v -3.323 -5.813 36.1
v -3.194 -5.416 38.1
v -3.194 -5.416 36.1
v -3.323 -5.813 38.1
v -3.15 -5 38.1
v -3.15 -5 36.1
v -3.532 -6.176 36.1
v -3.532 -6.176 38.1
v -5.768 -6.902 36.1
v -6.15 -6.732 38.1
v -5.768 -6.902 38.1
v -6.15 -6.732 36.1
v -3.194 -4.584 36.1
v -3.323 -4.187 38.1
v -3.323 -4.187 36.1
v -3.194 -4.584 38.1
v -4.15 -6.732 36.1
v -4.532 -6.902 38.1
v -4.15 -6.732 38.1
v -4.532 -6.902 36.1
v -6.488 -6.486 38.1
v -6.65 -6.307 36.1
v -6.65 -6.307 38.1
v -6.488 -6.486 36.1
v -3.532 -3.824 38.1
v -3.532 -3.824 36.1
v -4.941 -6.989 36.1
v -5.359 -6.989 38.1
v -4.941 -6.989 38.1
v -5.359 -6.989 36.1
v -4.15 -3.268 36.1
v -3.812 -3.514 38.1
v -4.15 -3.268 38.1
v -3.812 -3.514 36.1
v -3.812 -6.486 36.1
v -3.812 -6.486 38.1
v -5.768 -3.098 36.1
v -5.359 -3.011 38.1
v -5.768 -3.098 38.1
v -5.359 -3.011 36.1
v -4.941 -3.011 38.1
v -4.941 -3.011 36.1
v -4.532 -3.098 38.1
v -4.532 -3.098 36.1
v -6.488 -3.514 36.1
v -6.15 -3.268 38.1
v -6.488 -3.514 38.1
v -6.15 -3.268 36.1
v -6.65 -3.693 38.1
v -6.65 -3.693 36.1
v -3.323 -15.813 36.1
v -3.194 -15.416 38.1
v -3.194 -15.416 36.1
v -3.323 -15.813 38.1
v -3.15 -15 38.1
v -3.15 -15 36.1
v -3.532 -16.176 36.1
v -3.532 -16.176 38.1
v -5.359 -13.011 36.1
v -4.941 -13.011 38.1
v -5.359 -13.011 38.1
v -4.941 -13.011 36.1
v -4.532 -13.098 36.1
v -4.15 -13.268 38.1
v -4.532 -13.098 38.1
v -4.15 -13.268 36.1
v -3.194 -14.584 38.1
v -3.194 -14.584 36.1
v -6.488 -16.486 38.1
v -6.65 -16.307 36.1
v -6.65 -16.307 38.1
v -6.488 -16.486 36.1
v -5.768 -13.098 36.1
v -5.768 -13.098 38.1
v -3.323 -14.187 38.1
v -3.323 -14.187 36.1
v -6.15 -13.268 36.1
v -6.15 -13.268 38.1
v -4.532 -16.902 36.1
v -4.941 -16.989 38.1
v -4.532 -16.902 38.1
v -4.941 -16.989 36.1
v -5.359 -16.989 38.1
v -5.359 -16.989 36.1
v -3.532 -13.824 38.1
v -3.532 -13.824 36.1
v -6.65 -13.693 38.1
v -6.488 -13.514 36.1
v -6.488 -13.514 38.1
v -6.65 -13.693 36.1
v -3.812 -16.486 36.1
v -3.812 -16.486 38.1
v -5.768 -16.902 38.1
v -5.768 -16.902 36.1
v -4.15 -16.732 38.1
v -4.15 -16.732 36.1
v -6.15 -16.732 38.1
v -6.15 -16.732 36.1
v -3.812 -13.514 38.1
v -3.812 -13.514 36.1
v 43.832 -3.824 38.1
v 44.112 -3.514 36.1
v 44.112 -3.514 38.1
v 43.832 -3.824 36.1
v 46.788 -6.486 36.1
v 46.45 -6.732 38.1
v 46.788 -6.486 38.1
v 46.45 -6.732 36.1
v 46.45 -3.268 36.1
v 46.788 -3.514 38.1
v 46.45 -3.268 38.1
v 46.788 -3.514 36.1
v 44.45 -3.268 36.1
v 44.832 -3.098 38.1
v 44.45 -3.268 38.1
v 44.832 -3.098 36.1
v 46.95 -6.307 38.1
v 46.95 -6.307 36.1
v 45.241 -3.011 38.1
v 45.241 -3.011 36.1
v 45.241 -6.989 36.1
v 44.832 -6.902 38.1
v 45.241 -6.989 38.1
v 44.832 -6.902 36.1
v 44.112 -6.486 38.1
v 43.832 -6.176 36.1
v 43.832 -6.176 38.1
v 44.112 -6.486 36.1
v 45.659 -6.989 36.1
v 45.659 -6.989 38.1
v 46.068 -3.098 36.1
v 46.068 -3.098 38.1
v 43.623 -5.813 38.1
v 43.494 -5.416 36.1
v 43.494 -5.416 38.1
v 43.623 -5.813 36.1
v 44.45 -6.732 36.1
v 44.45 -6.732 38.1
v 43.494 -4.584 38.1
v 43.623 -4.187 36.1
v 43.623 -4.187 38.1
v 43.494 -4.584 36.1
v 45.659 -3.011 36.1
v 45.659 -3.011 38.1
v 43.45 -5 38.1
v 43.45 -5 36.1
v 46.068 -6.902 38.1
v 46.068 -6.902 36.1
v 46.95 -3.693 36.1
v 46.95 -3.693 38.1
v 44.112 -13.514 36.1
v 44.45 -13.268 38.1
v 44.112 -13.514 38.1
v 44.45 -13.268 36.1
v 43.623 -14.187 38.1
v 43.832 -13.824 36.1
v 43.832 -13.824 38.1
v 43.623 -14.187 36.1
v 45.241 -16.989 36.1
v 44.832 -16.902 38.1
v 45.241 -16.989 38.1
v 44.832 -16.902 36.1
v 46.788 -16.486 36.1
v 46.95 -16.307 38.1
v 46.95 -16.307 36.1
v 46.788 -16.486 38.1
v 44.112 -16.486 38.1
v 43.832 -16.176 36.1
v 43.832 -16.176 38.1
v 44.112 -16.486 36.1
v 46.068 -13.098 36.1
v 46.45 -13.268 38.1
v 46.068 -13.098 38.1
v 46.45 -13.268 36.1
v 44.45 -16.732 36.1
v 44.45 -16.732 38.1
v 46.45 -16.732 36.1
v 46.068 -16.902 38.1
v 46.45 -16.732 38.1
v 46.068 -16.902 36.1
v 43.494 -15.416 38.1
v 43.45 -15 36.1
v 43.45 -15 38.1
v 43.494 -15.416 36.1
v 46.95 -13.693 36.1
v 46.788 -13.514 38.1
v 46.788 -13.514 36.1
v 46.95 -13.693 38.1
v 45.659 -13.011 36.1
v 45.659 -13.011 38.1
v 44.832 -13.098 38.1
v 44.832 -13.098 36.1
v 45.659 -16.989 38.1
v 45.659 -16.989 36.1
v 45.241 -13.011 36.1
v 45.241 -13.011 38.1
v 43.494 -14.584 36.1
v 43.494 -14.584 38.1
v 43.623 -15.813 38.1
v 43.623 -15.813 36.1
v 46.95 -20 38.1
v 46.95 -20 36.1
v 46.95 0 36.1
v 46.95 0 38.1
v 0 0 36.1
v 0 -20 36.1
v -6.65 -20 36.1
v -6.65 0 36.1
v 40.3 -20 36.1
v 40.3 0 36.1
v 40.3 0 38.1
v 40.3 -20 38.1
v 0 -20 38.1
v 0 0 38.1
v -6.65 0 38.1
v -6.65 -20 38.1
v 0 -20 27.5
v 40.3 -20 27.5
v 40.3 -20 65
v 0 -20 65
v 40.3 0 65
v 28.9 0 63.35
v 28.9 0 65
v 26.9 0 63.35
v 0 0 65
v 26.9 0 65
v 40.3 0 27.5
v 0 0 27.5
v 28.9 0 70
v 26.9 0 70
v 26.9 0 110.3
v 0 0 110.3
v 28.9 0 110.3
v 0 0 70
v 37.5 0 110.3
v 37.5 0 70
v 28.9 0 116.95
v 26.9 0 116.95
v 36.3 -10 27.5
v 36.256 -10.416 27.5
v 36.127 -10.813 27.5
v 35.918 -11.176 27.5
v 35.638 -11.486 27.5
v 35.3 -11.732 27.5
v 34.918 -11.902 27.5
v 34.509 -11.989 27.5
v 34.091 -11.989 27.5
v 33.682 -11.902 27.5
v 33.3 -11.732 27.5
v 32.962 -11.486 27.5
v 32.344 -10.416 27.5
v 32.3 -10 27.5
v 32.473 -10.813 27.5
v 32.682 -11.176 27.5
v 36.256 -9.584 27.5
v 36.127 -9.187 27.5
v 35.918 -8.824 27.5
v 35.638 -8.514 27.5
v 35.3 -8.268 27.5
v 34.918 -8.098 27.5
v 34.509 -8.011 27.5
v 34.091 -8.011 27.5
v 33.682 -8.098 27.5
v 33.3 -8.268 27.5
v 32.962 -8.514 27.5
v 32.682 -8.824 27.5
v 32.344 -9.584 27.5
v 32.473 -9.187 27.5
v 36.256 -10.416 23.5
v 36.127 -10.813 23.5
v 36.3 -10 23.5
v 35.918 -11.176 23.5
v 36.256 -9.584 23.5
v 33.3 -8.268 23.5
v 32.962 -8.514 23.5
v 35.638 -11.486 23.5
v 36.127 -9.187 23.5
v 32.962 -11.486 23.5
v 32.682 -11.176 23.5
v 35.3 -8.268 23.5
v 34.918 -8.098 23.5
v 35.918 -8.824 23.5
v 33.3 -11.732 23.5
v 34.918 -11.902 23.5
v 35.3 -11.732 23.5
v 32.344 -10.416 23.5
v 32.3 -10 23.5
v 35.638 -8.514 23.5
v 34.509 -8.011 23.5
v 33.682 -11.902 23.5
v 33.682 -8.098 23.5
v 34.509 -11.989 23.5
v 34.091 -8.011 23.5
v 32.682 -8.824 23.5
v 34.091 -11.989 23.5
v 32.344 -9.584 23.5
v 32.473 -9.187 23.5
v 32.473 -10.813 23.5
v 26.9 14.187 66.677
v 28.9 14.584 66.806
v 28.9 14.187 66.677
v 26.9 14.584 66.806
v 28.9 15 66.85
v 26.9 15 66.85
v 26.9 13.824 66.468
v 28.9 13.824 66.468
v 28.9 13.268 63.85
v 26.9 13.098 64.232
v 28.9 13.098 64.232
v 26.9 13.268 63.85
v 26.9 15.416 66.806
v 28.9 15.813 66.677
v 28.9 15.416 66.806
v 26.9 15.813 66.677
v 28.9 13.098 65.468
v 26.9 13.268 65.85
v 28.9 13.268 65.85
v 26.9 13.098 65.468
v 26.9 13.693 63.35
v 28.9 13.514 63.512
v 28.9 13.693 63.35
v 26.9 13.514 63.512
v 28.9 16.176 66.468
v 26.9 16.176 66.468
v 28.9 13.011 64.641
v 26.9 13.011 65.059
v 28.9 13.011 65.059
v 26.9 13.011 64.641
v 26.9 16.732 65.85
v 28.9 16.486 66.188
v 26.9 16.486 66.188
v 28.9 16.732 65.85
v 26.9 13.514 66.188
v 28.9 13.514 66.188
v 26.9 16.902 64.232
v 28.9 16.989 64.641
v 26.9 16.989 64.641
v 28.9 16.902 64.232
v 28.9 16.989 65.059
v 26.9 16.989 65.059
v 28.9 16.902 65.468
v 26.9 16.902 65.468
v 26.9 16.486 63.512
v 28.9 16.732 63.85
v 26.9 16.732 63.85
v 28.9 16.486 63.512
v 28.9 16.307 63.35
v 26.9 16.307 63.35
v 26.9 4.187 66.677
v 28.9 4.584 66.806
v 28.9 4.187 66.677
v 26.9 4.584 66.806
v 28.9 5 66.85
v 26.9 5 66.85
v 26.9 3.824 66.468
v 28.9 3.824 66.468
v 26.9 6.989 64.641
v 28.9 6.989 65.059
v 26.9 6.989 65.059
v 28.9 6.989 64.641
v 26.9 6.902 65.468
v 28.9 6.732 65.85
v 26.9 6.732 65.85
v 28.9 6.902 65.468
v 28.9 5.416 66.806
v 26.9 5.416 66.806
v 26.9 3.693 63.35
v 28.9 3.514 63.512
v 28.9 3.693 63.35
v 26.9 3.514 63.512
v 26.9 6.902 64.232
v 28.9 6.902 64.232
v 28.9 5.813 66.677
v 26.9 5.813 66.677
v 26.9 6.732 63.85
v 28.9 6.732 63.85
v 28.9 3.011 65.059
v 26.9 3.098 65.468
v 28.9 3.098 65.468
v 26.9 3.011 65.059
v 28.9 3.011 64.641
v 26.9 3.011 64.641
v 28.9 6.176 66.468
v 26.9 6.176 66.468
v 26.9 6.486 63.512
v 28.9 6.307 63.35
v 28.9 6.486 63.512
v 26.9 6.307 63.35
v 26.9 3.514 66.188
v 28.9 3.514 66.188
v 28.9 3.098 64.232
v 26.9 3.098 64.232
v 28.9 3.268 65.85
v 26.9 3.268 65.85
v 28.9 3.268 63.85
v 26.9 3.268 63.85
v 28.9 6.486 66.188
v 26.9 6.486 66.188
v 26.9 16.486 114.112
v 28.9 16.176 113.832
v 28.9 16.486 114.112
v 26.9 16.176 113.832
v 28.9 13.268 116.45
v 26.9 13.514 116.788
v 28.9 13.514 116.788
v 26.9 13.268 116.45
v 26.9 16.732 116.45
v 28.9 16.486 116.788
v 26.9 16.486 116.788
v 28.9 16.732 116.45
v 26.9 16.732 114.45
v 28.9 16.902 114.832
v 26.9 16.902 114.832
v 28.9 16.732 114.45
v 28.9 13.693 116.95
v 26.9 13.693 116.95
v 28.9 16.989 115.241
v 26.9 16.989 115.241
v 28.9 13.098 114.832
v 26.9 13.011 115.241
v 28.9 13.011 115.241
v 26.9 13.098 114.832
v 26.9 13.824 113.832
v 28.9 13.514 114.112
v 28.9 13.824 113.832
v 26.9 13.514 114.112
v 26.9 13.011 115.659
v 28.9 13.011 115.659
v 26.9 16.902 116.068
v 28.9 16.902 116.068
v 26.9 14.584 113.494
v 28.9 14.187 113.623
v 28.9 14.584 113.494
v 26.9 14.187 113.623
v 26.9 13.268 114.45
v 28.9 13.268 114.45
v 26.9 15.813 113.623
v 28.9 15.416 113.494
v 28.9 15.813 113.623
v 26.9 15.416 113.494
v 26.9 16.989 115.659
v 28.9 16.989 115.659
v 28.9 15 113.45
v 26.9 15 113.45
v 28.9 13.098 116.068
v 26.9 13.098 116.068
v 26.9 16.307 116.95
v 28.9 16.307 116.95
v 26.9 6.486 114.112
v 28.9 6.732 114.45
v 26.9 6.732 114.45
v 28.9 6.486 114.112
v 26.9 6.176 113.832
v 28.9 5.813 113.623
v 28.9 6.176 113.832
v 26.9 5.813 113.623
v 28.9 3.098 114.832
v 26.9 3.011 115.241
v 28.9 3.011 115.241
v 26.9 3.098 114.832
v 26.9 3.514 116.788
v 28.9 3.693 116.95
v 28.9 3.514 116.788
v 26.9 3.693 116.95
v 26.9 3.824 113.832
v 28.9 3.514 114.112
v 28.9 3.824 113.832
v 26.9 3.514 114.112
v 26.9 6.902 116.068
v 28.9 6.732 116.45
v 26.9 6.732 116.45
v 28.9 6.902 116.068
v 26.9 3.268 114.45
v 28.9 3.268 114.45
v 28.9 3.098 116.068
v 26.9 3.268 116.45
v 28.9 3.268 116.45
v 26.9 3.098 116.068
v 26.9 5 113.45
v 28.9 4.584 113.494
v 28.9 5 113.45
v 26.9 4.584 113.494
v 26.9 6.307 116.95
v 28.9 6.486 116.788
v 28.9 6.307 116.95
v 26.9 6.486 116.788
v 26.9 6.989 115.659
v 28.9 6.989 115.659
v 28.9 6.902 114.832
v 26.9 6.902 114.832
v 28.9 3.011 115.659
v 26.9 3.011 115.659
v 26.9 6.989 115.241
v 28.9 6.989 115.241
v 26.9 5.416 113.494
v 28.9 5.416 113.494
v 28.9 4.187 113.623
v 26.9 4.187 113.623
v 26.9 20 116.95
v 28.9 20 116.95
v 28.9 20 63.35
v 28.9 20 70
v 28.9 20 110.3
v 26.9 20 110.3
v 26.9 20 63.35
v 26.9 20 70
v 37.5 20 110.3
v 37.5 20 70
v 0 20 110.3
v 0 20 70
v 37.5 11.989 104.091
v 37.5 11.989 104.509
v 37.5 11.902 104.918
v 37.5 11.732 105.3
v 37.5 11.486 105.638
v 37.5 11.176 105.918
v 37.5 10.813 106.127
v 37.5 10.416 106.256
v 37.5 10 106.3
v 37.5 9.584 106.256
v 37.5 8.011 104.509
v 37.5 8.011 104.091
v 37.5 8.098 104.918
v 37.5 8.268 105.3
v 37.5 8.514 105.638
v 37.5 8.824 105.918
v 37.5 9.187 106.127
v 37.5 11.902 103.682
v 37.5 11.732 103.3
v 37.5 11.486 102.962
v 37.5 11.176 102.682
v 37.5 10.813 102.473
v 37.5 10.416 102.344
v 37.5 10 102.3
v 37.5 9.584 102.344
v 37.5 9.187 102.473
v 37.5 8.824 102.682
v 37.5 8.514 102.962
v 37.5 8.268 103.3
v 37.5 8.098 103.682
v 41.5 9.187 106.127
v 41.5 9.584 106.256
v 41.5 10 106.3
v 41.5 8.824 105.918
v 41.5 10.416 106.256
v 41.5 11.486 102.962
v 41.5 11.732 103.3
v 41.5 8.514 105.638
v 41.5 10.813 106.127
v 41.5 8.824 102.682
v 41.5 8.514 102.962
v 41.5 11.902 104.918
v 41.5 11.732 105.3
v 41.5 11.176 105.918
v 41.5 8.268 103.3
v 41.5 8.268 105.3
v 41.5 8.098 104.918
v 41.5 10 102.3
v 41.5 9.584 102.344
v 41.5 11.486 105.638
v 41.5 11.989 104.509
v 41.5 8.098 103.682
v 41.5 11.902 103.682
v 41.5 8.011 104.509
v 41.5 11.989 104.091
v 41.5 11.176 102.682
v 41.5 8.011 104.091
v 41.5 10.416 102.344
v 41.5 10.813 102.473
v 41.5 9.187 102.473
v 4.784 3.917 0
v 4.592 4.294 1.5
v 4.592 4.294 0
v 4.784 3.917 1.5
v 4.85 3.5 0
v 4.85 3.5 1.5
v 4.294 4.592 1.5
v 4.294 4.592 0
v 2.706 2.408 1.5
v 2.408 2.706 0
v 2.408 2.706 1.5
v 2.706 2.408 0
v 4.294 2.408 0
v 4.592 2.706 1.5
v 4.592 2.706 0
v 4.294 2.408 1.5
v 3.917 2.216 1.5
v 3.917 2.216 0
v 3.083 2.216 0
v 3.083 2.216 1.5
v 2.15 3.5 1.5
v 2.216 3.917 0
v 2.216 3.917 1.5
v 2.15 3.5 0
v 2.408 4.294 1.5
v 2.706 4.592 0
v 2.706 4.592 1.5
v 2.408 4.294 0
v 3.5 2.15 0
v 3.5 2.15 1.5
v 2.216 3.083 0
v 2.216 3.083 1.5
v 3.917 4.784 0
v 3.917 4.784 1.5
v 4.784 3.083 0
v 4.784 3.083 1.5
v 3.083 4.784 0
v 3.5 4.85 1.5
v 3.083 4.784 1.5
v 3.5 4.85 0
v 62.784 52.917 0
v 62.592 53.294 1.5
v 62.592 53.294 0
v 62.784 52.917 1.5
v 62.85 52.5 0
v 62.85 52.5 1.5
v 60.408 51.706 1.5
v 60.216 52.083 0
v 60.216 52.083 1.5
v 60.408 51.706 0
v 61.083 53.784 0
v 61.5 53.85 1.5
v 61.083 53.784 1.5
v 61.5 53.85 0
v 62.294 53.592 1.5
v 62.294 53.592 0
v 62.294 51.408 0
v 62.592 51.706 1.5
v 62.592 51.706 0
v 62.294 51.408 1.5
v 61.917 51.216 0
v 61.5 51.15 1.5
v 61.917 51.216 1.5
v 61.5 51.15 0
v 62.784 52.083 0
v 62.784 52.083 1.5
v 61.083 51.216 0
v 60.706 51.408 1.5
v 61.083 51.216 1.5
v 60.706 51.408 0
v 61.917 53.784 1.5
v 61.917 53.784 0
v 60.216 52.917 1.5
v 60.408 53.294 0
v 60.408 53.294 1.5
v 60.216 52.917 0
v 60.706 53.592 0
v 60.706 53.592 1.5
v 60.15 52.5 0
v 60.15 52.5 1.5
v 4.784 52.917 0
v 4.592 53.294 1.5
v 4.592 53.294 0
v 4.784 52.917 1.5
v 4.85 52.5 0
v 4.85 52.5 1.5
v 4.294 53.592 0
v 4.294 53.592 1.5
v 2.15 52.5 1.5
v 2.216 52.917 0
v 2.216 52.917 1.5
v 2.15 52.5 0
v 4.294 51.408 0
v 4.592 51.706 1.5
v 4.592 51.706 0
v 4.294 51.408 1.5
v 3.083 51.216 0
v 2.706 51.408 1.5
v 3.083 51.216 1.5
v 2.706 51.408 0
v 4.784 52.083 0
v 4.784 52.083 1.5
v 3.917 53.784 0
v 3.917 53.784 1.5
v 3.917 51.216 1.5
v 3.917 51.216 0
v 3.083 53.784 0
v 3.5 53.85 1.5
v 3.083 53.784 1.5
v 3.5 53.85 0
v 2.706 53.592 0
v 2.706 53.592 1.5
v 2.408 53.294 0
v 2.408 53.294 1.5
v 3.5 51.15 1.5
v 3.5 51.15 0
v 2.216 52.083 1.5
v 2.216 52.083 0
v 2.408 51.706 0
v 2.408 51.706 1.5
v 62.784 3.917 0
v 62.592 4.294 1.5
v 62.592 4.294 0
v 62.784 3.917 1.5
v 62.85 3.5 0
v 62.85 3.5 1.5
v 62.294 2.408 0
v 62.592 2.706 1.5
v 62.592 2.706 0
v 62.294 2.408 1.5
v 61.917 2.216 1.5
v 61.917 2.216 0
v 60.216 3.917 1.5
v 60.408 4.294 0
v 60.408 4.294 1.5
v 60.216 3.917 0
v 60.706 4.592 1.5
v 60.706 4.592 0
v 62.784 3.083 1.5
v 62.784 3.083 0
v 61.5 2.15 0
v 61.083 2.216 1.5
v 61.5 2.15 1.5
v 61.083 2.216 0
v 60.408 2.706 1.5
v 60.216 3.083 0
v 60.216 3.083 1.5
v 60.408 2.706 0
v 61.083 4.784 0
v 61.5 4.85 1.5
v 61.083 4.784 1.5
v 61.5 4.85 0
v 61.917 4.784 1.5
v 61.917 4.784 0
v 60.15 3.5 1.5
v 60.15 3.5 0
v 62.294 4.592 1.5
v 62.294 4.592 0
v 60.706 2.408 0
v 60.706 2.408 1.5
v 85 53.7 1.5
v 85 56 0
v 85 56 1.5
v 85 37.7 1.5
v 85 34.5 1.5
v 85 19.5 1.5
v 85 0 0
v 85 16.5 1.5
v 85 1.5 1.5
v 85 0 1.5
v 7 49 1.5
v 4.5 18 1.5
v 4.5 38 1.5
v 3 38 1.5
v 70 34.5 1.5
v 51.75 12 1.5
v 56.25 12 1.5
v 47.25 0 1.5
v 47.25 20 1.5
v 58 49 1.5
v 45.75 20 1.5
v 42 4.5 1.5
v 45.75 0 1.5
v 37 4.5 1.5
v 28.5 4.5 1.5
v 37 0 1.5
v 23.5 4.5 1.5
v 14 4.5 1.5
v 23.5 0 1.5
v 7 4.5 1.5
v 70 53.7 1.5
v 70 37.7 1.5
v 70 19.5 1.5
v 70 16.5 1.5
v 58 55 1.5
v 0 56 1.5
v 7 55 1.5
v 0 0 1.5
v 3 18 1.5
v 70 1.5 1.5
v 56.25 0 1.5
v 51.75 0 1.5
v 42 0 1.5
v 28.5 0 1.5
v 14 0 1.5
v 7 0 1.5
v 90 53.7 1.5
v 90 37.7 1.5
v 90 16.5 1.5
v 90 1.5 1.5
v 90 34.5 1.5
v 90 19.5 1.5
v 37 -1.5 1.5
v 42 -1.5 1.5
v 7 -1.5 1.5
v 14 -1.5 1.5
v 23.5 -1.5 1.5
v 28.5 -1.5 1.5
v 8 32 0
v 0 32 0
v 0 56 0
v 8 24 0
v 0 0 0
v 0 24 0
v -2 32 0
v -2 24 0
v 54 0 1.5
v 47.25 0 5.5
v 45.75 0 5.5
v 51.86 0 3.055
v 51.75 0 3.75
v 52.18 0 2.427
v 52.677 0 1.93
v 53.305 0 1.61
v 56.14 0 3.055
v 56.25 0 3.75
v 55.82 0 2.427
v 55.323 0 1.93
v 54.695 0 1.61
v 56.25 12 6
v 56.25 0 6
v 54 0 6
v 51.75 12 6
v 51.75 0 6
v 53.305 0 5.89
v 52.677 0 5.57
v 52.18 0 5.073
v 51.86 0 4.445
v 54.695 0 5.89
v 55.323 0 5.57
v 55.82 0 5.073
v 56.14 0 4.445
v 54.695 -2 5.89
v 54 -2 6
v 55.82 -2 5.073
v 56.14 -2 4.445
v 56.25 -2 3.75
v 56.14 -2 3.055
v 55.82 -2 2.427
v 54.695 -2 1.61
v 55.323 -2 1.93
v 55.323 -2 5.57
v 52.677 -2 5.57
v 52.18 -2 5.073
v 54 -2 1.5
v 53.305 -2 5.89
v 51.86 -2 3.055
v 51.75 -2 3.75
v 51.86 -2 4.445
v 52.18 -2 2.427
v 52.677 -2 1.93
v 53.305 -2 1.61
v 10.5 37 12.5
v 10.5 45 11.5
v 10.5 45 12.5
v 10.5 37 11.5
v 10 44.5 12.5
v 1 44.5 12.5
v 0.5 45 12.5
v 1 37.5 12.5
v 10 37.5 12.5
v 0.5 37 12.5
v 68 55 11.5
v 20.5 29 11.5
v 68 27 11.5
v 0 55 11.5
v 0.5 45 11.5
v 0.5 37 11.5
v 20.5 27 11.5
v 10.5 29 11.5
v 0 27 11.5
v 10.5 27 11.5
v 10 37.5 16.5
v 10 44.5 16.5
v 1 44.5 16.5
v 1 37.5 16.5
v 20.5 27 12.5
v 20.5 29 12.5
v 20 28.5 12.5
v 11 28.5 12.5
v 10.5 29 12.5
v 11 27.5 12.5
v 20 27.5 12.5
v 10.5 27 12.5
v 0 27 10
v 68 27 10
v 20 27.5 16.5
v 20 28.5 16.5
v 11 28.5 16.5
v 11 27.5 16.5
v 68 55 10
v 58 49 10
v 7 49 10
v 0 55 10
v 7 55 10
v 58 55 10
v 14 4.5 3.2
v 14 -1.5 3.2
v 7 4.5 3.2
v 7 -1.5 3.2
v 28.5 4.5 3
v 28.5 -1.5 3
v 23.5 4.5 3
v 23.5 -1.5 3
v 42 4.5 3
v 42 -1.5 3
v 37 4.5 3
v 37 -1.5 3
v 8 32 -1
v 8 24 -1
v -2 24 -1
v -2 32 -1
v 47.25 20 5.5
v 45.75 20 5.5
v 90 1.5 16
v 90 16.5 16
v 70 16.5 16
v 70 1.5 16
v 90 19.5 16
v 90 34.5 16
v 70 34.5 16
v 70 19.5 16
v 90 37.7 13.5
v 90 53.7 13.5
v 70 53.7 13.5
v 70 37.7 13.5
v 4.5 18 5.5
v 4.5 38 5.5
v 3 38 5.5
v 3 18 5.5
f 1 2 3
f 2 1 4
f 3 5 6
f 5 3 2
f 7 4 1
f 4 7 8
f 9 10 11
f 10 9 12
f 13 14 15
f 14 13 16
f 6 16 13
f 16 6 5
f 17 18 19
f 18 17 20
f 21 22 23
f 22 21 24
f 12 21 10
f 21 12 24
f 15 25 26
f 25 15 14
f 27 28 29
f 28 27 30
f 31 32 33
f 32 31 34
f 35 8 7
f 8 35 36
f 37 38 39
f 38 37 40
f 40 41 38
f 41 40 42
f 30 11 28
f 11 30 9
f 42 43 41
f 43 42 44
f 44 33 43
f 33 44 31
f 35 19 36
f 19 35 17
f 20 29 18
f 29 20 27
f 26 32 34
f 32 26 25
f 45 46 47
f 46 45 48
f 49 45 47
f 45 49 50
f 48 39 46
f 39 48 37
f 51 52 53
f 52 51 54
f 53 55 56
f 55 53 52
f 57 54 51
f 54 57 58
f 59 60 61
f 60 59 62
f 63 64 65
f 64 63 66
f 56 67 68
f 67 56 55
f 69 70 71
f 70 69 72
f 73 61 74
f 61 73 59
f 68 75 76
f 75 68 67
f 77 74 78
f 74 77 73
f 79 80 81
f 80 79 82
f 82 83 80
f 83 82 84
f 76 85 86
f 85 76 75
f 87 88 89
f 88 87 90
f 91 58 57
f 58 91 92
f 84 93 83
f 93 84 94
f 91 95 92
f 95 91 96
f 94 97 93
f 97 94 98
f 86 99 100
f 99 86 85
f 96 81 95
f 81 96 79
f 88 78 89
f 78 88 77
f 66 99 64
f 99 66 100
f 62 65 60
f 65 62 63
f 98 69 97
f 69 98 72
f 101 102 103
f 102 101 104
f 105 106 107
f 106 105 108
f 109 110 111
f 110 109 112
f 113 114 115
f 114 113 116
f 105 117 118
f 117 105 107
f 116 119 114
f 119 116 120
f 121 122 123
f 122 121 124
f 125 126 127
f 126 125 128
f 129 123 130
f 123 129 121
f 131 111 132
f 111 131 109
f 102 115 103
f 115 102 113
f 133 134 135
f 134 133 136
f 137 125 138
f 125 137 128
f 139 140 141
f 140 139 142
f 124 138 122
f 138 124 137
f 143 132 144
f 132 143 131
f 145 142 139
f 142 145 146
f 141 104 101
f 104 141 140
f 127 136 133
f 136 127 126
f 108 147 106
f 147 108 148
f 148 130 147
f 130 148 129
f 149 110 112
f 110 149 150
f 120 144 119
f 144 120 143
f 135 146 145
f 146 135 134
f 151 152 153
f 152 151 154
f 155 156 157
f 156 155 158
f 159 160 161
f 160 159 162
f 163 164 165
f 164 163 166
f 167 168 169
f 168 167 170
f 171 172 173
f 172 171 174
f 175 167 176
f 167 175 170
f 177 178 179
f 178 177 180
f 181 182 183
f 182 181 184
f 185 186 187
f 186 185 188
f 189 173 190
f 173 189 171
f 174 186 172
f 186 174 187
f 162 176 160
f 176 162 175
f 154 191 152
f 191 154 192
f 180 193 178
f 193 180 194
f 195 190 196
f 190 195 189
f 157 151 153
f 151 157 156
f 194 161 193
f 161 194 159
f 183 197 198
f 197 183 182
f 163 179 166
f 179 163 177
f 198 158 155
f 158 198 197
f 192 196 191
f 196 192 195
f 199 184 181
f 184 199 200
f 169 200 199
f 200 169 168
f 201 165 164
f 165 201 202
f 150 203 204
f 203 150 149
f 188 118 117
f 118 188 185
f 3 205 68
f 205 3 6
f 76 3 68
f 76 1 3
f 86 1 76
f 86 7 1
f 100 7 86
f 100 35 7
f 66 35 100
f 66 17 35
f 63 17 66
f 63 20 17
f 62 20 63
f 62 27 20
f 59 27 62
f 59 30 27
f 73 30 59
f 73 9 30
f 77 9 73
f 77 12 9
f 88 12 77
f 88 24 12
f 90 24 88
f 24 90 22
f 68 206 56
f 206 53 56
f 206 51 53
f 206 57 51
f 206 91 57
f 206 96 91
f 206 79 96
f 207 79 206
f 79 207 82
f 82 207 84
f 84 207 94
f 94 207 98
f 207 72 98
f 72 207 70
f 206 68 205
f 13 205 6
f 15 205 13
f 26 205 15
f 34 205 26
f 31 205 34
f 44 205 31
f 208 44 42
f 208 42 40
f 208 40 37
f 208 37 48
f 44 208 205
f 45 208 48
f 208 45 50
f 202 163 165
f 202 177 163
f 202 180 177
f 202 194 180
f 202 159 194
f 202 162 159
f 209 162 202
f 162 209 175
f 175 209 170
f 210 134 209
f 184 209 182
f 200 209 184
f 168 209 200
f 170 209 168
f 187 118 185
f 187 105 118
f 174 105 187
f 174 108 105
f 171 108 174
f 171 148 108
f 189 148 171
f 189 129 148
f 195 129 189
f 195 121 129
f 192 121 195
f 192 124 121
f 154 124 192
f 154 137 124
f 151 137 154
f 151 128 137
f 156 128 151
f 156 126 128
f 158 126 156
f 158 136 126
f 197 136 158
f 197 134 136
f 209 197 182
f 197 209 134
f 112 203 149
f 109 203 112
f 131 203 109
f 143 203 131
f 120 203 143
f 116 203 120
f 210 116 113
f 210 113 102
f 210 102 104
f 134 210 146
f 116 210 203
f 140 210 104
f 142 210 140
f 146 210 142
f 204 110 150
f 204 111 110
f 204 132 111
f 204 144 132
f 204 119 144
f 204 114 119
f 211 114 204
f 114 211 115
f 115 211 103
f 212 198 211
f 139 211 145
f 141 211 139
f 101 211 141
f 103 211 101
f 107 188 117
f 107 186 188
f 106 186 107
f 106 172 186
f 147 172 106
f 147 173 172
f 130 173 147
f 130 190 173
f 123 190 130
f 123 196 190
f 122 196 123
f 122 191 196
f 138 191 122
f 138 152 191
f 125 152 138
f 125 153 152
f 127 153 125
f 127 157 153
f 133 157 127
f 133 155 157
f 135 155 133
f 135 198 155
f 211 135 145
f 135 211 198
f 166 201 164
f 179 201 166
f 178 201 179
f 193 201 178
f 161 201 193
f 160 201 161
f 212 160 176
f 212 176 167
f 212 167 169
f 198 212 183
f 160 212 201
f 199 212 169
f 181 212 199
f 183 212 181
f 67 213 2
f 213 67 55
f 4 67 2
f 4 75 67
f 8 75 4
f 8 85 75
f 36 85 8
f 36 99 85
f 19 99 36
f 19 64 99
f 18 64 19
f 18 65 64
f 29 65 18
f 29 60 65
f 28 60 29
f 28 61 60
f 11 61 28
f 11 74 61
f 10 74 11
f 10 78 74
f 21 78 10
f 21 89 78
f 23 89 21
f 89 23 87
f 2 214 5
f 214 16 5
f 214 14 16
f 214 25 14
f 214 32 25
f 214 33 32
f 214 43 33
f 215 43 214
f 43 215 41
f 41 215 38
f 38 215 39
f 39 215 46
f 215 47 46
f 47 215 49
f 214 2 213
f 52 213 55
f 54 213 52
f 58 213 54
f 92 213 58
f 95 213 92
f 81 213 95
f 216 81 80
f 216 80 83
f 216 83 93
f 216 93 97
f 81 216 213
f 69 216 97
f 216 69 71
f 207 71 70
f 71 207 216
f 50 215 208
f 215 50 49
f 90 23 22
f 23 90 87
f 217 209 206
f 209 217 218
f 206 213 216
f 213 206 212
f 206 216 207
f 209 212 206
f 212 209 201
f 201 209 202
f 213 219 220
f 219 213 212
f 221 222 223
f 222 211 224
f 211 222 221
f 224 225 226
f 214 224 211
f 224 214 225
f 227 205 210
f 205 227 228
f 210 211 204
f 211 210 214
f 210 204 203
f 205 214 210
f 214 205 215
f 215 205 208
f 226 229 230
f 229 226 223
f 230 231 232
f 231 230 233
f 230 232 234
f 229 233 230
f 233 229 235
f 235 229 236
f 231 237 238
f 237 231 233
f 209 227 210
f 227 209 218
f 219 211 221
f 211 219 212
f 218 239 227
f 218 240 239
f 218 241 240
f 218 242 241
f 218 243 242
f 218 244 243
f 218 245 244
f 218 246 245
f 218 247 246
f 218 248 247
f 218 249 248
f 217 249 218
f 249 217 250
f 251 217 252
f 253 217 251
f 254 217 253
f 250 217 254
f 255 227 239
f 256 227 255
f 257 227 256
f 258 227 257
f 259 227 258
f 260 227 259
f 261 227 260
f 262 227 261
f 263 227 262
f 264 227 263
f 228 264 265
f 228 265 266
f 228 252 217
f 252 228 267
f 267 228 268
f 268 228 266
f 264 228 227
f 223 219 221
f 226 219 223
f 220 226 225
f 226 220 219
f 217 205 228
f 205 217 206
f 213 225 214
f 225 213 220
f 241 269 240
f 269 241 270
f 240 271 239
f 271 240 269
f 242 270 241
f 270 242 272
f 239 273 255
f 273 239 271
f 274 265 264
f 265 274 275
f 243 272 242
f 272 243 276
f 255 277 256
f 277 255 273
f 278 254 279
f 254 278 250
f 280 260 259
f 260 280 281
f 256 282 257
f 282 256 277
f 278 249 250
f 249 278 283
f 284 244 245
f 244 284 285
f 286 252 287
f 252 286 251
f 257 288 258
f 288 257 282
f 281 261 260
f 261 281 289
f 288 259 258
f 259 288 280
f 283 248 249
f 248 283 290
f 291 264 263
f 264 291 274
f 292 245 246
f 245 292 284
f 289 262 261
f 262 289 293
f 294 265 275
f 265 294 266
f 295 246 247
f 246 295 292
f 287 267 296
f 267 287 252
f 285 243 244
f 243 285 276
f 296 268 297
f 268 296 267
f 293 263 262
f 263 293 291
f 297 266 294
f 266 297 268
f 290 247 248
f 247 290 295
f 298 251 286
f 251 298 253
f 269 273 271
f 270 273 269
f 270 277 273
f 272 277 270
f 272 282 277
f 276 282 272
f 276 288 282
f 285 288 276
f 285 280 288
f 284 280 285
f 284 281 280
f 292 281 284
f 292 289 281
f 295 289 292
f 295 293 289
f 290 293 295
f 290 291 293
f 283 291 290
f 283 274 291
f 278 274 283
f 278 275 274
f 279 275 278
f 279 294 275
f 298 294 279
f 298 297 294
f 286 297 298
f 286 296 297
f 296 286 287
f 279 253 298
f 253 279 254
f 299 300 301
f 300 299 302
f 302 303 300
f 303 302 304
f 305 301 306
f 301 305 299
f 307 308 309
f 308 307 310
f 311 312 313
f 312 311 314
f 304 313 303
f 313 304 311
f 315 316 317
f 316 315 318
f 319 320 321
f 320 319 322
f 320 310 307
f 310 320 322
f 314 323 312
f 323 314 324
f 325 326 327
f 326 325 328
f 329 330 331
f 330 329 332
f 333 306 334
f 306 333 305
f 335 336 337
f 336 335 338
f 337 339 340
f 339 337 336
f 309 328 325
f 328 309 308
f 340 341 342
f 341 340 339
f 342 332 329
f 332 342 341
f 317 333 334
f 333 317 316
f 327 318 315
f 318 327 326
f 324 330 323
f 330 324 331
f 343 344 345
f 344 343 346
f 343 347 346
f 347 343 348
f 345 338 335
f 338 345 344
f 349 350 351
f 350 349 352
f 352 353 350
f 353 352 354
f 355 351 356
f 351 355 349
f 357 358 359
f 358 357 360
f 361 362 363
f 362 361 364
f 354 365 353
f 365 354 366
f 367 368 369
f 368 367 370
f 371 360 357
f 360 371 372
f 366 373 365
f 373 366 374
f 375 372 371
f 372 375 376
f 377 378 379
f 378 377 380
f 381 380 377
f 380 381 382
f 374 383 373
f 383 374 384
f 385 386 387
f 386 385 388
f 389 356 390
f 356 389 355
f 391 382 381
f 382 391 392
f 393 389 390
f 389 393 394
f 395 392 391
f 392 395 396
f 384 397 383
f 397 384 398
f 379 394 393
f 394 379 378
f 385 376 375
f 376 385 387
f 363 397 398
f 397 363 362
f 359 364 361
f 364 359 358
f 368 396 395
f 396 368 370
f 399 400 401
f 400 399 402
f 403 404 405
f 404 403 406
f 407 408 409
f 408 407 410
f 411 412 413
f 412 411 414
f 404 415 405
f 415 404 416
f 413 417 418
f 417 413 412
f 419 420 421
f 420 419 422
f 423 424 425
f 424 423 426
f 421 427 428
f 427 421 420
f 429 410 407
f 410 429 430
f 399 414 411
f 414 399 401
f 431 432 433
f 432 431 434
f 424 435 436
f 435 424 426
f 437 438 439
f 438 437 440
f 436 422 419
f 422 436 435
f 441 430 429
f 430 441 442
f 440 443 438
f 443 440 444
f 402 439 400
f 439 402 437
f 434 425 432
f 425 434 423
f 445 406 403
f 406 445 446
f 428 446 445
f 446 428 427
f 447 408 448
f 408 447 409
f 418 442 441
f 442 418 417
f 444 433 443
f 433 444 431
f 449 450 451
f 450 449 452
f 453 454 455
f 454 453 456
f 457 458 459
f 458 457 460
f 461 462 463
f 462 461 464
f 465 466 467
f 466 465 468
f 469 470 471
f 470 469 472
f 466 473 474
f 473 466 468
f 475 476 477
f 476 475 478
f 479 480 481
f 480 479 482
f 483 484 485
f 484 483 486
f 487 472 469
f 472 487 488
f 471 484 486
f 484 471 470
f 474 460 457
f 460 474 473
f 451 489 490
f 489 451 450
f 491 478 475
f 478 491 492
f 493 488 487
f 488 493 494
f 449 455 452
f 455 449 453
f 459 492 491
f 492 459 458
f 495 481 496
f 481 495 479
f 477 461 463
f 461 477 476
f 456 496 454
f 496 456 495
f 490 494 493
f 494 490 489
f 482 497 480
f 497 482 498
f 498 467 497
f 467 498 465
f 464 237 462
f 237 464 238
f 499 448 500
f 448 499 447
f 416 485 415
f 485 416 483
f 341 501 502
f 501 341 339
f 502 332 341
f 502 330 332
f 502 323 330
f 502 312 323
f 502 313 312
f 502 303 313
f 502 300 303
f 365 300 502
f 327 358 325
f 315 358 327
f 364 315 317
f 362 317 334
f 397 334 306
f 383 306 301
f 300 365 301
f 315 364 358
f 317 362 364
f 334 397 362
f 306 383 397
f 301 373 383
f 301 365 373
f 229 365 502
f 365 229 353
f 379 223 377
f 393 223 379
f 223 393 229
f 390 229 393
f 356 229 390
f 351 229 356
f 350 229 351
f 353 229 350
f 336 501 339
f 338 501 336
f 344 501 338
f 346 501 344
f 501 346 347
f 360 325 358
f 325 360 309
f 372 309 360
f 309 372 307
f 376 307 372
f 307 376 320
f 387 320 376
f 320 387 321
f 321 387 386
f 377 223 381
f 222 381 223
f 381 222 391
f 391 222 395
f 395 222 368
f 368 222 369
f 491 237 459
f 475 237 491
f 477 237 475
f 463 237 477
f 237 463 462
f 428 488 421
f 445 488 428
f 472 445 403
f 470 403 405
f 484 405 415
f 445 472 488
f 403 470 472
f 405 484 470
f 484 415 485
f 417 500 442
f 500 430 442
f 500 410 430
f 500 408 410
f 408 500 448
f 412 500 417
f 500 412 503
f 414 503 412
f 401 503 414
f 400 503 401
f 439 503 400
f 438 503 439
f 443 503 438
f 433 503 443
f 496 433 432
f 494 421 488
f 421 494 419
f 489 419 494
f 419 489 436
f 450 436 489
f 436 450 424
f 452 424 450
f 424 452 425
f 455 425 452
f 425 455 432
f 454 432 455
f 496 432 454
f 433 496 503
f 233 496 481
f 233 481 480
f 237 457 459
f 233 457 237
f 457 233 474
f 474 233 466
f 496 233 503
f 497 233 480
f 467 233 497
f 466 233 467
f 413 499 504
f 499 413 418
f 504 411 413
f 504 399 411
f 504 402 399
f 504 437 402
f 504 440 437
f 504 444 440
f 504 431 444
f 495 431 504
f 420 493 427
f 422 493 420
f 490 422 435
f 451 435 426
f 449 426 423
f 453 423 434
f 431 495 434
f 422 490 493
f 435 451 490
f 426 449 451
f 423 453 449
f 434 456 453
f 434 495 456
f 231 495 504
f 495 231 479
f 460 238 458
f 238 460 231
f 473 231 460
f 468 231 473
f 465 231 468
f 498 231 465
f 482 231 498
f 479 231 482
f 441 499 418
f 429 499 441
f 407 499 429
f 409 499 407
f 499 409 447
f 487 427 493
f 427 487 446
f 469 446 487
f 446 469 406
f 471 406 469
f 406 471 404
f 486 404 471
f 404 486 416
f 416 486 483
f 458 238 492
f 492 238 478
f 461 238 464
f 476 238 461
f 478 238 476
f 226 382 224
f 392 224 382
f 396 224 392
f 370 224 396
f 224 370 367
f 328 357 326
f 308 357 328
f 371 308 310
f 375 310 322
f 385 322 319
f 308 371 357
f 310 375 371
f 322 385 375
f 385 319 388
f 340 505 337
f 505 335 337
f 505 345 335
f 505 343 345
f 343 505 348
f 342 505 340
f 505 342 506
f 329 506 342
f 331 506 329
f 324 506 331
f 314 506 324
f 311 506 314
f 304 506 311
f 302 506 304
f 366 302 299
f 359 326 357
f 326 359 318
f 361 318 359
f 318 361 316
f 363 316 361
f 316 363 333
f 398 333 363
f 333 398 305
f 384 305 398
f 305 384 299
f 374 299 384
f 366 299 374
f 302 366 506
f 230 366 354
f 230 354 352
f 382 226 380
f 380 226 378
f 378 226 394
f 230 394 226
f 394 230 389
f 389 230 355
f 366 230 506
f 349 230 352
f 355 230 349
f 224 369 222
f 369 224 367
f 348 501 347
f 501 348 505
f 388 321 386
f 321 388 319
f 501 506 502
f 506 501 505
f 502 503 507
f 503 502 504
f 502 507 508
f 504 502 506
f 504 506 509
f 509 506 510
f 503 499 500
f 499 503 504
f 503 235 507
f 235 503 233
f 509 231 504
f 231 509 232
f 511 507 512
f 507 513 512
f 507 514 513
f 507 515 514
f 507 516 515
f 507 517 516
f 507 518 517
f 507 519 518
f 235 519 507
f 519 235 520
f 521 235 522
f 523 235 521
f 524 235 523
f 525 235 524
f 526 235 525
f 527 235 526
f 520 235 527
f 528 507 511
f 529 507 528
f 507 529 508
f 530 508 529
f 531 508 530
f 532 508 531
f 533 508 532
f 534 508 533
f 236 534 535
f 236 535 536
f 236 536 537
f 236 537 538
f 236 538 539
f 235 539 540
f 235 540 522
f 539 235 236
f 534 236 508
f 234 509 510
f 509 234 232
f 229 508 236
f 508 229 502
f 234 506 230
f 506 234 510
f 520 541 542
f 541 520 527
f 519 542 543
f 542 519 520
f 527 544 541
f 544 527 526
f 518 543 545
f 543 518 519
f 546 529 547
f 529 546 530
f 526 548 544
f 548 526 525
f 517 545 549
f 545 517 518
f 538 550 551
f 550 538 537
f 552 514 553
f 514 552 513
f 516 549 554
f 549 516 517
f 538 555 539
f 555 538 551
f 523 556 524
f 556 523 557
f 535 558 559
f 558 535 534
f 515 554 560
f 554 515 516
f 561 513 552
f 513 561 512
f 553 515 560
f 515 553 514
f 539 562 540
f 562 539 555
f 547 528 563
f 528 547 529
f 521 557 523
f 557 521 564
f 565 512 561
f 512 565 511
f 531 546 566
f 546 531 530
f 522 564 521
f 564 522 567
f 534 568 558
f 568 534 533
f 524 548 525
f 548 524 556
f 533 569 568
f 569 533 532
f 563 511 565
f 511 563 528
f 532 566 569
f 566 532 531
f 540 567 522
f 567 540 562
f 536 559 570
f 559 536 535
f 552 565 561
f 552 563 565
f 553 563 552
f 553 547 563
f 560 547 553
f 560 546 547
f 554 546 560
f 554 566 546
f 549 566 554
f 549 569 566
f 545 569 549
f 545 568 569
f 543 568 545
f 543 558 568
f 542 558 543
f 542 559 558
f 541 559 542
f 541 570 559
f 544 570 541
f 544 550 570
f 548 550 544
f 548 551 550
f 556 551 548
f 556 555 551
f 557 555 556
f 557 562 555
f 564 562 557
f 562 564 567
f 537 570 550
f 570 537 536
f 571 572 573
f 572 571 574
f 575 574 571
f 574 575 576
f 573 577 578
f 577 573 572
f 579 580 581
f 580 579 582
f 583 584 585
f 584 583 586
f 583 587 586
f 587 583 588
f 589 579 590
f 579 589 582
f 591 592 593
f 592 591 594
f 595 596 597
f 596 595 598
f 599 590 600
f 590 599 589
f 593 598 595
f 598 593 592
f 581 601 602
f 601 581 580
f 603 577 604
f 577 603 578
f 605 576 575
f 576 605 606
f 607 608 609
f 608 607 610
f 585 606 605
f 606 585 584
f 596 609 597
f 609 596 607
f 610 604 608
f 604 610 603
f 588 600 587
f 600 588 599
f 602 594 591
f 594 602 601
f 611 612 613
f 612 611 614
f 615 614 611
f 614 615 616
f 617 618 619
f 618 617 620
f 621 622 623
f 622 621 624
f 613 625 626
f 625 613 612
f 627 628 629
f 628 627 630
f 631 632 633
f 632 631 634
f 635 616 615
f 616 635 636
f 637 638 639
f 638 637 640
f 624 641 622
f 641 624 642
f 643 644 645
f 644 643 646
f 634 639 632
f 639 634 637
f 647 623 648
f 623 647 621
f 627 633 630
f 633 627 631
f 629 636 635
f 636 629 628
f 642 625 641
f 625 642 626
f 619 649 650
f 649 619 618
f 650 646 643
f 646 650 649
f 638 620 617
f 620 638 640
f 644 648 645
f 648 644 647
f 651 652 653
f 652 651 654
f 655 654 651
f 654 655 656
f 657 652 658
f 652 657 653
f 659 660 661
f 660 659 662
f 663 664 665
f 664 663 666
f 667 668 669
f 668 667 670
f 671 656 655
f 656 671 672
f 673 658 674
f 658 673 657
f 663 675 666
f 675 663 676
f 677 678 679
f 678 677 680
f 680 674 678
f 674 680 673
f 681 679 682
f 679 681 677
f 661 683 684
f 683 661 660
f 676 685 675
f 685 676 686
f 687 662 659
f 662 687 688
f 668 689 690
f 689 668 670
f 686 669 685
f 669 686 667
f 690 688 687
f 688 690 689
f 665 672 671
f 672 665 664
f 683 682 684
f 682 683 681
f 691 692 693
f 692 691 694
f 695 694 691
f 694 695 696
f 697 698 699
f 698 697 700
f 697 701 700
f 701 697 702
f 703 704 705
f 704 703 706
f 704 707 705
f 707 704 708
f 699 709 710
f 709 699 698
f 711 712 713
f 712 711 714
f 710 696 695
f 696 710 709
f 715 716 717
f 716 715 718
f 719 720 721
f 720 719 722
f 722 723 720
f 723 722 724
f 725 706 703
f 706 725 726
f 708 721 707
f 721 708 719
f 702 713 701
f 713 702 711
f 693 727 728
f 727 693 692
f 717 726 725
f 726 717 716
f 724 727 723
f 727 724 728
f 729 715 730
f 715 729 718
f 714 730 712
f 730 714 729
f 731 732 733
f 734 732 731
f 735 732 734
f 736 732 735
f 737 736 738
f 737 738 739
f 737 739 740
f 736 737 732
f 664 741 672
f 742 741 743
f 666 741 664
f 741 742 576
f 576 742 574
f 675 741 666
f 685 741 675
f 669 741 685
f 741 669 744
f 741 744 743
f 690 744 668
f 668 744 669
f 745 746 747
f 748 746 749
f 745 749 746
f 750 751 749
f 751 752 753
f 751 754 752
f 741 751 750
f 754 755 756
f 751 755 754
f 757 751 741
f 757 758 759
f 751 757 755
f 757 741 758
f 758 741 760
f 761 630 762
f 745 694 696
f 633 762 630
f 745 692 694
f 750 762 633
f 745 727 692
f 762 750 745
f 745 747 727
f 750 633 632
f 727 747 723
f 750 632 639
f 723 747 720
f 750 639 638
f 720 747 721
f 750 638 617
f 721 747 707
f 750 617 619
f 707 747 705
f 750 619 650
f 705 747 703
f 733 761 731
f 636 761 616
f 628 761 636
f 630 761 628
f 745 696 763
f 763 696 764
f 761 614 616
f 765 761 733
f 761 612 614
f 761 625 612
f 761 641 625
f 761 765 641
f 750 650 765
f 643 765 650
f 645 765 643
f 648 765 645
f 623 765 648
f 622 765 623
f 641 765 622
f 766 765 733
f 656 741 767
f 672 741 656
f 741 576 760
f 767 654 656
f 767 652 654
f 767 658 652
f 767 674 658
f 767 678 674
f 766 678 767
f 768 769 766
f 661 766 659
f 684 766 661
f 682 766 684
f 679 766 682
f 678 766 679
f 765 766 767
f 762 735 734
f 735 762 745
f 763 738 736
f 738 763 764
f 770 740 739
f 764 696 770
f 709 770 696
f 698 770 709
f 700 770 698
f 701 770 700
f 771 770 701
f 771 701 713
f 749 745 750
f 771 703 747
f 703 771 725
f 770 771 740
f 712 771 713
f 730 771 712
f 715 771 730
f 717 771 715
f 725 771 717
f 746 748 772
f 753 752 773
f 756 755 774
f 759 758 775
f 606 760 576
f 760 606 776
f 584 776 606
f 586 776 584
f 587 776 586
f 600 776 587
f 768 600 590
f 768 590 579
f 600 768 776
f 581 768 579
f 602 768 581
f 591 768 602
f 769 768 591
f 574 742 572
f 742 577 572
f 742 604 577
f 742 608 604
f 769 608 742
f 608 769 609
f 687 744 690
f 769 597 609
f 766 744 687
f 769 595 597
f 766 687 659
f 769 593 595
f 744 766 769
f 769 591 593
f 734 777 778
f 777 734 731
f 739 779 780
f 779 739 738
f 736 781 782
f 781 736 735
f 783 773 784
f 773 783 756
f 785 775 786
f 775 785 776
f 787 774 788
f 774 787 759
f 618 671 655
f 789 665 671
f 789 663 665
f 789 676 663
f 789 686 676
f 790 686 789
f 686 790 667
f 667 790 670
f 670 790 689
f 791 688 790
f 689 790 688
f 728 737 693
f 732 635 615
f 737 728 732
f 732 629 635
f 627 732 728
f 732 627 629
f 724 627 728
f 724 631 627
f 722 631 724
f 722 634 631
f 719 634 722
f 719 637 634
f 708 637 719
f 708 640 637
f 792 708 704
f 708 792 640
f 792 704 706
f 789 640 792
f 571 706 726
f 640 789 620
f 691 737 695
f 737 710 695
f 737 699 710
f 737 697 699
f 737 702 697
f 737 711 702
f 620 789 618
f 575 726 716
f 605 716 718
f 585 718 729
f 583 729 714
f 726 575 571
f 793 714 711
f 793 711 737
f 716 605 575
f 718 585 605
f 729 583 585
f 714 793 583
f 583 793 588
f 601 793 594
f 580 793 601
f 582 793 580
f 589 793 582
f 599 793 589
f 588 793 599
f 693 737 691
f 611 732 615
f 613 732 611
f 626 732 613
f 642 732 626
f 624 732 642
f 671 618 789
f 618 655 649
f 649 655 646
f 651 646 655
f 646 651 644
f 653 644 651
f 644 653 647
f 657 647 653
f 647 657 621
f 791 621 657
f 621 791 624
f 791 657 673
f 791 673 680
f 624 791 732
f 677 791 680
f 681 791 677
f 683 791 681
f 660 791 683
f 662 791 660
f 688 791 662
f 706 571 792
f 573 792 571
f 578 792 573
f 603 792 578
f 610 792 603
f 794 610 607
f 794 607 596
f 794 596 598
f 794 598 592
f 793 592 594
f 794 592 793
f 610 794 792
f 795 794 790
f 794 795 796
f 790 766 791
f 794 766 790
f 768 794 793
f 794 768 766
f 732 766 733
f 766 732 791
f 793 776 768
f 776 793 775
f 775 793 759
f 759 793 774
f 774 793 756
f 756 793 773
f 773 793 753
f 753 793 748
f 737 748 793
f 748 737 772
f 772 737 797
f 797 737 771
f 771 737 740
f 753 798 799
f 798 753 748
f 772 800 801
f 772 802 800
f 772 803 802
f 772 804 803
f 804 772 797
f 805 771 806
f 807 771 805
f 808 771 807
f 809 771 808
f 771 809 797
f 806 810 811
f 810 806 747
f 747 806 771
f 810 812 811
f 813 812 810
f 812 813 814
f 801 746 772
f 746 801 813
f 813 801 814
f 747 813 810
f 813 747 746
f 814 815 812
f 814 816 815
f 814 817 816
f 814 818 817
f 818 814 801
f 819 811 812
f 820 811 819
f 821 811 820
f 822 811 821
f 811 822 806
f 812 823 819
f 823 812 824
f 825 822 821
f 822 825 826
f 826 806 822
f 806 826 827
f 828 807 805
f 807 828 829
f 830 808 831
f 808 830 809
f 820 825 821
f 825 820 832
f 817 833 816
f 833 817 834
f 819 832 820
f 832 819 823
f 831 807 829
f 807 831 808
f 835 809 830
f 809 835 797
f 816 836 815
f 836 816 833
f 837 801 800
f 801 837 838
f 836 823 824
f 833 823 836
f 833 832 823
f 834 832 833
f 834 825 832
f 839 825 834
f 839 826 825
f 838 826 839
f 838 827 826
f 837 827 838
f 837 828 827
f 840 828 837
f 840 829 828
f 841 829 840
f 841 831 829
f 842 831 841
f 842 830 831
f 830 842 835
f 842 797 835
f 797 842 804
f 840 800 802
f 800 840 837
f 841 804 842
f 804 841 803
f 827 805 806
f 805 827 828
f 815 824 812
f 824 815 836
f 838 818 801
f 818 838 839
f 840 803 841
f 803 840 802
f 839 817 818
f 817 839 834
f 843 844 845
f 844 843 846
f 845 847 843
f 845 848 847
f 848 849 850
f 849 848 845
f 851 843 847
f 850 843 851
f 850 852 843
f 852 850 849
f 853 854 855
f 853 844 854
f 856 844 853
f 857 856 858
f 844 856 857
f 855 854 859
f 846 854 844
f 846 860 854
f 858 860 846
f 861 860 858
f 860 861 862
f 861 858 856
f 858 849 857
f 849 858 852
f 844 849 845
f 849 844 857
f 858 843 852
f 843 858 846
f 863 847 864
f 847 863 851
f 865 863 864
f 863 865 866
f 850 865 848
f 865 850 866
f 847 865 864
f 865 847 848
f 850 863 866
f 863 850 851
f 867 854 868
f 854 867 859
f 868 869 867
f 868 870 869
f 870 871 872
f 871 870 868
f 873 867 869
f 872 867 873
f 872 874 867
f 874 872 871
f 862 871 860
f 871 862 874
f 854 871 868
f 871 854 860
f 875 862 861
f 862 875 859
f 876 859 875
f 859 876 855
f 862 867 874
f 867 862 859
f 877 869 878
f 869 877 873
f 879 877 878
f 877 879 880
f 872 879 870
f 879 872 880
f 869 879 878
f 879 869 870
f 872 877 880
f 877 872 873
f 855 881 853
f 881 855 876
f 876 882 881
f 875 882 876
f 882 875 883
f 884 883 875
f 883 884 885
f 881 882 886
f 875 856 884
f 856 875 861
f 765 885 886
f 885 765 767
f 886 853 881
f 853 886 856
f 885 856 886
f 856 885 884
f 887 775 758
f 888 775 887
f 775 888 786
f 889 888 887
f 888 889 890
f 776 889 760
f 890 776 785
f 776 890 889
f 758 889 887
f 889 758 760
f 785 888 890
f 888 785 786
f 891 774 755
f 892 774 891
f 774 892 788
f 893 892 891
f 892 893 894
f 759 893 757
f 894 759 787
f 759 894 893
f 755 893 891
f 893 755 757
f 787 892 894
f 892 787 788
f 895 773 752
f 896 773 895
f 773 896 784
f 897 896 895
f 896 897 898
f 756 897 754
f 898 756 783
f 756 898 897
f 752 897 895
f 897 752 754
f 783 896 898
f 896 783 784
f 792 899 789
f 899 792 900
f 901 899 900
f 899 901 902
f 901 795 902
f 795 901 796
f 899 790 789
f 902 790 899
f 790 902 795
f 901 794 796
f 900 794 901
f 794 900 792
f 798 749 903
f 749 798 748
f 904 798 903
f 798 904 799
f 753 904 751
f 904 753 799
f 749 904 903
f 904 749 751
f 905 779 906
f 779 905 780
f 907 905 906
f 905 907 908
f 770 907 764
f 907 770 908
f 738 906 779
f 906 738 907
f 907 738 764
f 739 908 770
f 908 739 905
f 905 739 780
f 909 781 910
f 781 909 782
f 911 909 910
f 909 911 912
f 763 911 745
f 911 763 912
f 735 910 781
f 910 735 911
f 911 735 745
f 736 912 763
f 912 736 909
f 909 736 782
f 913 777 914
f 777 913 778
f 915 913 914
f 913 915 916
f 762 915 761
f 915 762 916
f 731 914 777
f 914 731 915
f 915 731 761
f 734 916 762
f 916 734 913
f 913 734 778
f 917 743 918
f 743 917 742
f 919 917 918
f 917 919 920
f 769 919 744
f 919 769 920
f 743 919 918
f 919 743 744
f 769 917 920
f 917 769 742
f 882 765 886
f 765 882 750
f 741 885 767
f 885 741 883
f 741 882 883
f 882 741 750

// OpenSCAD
// file: structs/mg996rServo.scad
$fn = 30;

module mg996rServo() {
	flange_width = 53.6;
	flange_height_offset = 26.9;
	flange_height = 2;
	main_width = 40.3;
	depth = 20;
	height = 37.5;

		cube([main_width, depth, height]);
		translate([main_width/2-flange_width/2,0,flange_height_offset]) {
			difference() {
				cube([flange_width, depth, flange_height]);
				translate([0,depth/2,-2.5]) {
					translate([1.5,-5,0]) cylinder(d=4, h=5);
					translate([1.5,5,0]) cylinder(d=4, h=5);
					translate([flange_width - 1.5,-5,0]) cylinder(d=4, h=5);
					translate([flange_width - 1.5,5,0]) cylinder(d=4, h=5);
				}
			}
		}
	translate([34.3, depth/2, height]) color("orange") cylinder(r=2, h=4);
}

mg996rServo();
// file: structs/rpi4.scad
$fn = 20;

module RPi4() {
	boardDepth = 56;
	boardWidth = 85;
	UsbAndEthernetOffset = boardWidth - 15;

	BaseBoard();
	translate([7, -1.5, baseBoardHeight]) UsbC();
	translate([3.5 + 7.7 + 14.8 - HdmiMiniWidth/2, -1.5, baseBoardHeight]) HdmiMini();
	translate([3.5 + 7.7 + 14.8 + 13.5 - HdmiMiniWidth/2, -1.5, baseBoardHeight]) HdmiMini();

	//SD
	translate([-2,boardDepth/2-sdDepth/2, -sdHeight]) SdCard();

	//Camera Ribbon Cable
	translate([3.5 + 7.7 + 14.8 + 13.5 + 7- RibbonHeaderWidth/2, 0, baseBoardHeight]) RibbonHeader();

	translate([3.5 + 7.7 + 14.8 + 13.5 + 7 + 7.5 - HeadphoneJackWidth/2, 0, baseBoardHeight]) HeadphoneJack();
	translate([UsbAndEthernetOffset, 9 - UsbADepth/2, baseBoardHeight]) UsbA();
	translate([UsbAndEthernetOffset, 27 - UsbADepth/2, baseBoardHeight]) UsbA();
	translate([UsbAndEthernetOffset, 45.7 - EthernetDepth/2, baseBoardHeight]) Ethernet();

	//Diplay Ribbon Cable
	translate([3,HoleOffset+24.5-RibbonHeaderDepth/2, baseBoardHeight]) RibbonHeader();

	//GPIO
	GPIOHeight = 8.5;
	GPIODepth = 6;
	senseHatDepth = 28;

	translate([7, 49, baseBoardHeight]) GPIO();
	translate([0, 49+GPIODepth-senseHatDepth, baseBoardHeight + GPIOHeight]) SenseHat();

	baseBoardHeight = 1.5;
	RPiColor = "Green";
	HoleOffset = 3.5;
	module BaseBoard() {
		color( c = RPiColor) {
			difference() { 
				cube([85, 56, baseBoardHeight]);
				Holes(HoleOffset, HoleOffset);
			}
		}
	}

	HoleDistance = 58;
	module Holes(bottomLeftX, bottomLeftY) {
		translate([bottomLeftX, bottomLeftY, 0]) {
			Hole(0,0,0);
			Hole(HoleDistance, 49, 0);
			Hole(0, 49, 0);
			Hole(HoleDistance, 0, 0);
		}
	}

	module Hole(x, y, z) {
		translate([x, y, z-5]) {
			cylinder(d=2.7, h=10);
		}
	};

	module UsbC() {
		cube([7, 6, 3.2-baseBoardHeight]);
	}

	HdmiMiniWidth = 5;
	module HdmiMini() {
		cube([5, 6, 3.0-baseBoardHeight]);
	}

	RibbonHeaderWidth = 1.5;
	RibbonHeaderDepth = 20;
	RibbonHeaderColor = "Cornsilk";
	module RibbonHeader() {
		color(RibbonHeaderColor) {
			cube([RibbonHeaderWidth, RibbonHeaderDepth, 5.5-baseBoardHeight]);
		}
	}

	HeadphoneJackWidth = 4.5;
	module HeadphoneJack() {
		cube([HeadphoneJackWidth, 12, 6-baseBoardHeight]);
		translate([HeadphoneJackWidth/2, 0, HeadphoneJackWidth/2]) rotate([90,0,0]) cylinder(d=HeadphoneJackWidth, h=2);
	}

	UsbADepth = 15;
	module UsbA() {
		cube([20, UsbADepth, 16-baseBoardHeight]);
	}

	EthernetDepth = 16;
	EthernetWidth = 20;
	module Ethernet() {
		cube([EthernetWidth, EthernetDepth, 13.5-baseBoardHeight]);
	}

	module GPIO() {
		color("black") cube([HoleDistance - 3.5*2, GPIODepth, GPIOHeight]);
	}

	module SenseHat() {
		color("blue") cube([UsbAndEthernetOffset-2, senseHatDepth, baseBoardHeight]);
		headerDepth = 8;
		headerWidth = 10;
		xOffset = 0.5;
		translate([xOffset, senseHatDepth/2 - headerDepth/2, baseBoardHeight]) {
			color("yellow") cube([headerWidth, headerDepth, 1]);
			translate([0.5, 0.5]) color("grey") cube([headerWidth-1, headerDepth-1, 5]);
		}
		smallHeaderDepth = 2;
		translate([headerWidth + xOffset ,0,baseBoardHeight]) {
			color("yellow") cube([headerWidth, smallHeaderDepth, 1]);
			translate([0.5, 0.5]) color("grey") cube([headerWidth-1, smallHeaderDepth-1, 5]);
		}
	}

	sdDepth = 8;
	sdHeight = 1;
	module SdCard() {
		cube([10, sdDepth, 1]);
	}
}
RPi4();
// main file
use <structs/rpi4.scad>
use <structs/mg996rServo.scad>

translate([0,0,65]) rotate([180,0,0]) mg996rServo();
translate([0,20,70]) rotate([0,-90,180]) mg996rServo();
RPi4();
